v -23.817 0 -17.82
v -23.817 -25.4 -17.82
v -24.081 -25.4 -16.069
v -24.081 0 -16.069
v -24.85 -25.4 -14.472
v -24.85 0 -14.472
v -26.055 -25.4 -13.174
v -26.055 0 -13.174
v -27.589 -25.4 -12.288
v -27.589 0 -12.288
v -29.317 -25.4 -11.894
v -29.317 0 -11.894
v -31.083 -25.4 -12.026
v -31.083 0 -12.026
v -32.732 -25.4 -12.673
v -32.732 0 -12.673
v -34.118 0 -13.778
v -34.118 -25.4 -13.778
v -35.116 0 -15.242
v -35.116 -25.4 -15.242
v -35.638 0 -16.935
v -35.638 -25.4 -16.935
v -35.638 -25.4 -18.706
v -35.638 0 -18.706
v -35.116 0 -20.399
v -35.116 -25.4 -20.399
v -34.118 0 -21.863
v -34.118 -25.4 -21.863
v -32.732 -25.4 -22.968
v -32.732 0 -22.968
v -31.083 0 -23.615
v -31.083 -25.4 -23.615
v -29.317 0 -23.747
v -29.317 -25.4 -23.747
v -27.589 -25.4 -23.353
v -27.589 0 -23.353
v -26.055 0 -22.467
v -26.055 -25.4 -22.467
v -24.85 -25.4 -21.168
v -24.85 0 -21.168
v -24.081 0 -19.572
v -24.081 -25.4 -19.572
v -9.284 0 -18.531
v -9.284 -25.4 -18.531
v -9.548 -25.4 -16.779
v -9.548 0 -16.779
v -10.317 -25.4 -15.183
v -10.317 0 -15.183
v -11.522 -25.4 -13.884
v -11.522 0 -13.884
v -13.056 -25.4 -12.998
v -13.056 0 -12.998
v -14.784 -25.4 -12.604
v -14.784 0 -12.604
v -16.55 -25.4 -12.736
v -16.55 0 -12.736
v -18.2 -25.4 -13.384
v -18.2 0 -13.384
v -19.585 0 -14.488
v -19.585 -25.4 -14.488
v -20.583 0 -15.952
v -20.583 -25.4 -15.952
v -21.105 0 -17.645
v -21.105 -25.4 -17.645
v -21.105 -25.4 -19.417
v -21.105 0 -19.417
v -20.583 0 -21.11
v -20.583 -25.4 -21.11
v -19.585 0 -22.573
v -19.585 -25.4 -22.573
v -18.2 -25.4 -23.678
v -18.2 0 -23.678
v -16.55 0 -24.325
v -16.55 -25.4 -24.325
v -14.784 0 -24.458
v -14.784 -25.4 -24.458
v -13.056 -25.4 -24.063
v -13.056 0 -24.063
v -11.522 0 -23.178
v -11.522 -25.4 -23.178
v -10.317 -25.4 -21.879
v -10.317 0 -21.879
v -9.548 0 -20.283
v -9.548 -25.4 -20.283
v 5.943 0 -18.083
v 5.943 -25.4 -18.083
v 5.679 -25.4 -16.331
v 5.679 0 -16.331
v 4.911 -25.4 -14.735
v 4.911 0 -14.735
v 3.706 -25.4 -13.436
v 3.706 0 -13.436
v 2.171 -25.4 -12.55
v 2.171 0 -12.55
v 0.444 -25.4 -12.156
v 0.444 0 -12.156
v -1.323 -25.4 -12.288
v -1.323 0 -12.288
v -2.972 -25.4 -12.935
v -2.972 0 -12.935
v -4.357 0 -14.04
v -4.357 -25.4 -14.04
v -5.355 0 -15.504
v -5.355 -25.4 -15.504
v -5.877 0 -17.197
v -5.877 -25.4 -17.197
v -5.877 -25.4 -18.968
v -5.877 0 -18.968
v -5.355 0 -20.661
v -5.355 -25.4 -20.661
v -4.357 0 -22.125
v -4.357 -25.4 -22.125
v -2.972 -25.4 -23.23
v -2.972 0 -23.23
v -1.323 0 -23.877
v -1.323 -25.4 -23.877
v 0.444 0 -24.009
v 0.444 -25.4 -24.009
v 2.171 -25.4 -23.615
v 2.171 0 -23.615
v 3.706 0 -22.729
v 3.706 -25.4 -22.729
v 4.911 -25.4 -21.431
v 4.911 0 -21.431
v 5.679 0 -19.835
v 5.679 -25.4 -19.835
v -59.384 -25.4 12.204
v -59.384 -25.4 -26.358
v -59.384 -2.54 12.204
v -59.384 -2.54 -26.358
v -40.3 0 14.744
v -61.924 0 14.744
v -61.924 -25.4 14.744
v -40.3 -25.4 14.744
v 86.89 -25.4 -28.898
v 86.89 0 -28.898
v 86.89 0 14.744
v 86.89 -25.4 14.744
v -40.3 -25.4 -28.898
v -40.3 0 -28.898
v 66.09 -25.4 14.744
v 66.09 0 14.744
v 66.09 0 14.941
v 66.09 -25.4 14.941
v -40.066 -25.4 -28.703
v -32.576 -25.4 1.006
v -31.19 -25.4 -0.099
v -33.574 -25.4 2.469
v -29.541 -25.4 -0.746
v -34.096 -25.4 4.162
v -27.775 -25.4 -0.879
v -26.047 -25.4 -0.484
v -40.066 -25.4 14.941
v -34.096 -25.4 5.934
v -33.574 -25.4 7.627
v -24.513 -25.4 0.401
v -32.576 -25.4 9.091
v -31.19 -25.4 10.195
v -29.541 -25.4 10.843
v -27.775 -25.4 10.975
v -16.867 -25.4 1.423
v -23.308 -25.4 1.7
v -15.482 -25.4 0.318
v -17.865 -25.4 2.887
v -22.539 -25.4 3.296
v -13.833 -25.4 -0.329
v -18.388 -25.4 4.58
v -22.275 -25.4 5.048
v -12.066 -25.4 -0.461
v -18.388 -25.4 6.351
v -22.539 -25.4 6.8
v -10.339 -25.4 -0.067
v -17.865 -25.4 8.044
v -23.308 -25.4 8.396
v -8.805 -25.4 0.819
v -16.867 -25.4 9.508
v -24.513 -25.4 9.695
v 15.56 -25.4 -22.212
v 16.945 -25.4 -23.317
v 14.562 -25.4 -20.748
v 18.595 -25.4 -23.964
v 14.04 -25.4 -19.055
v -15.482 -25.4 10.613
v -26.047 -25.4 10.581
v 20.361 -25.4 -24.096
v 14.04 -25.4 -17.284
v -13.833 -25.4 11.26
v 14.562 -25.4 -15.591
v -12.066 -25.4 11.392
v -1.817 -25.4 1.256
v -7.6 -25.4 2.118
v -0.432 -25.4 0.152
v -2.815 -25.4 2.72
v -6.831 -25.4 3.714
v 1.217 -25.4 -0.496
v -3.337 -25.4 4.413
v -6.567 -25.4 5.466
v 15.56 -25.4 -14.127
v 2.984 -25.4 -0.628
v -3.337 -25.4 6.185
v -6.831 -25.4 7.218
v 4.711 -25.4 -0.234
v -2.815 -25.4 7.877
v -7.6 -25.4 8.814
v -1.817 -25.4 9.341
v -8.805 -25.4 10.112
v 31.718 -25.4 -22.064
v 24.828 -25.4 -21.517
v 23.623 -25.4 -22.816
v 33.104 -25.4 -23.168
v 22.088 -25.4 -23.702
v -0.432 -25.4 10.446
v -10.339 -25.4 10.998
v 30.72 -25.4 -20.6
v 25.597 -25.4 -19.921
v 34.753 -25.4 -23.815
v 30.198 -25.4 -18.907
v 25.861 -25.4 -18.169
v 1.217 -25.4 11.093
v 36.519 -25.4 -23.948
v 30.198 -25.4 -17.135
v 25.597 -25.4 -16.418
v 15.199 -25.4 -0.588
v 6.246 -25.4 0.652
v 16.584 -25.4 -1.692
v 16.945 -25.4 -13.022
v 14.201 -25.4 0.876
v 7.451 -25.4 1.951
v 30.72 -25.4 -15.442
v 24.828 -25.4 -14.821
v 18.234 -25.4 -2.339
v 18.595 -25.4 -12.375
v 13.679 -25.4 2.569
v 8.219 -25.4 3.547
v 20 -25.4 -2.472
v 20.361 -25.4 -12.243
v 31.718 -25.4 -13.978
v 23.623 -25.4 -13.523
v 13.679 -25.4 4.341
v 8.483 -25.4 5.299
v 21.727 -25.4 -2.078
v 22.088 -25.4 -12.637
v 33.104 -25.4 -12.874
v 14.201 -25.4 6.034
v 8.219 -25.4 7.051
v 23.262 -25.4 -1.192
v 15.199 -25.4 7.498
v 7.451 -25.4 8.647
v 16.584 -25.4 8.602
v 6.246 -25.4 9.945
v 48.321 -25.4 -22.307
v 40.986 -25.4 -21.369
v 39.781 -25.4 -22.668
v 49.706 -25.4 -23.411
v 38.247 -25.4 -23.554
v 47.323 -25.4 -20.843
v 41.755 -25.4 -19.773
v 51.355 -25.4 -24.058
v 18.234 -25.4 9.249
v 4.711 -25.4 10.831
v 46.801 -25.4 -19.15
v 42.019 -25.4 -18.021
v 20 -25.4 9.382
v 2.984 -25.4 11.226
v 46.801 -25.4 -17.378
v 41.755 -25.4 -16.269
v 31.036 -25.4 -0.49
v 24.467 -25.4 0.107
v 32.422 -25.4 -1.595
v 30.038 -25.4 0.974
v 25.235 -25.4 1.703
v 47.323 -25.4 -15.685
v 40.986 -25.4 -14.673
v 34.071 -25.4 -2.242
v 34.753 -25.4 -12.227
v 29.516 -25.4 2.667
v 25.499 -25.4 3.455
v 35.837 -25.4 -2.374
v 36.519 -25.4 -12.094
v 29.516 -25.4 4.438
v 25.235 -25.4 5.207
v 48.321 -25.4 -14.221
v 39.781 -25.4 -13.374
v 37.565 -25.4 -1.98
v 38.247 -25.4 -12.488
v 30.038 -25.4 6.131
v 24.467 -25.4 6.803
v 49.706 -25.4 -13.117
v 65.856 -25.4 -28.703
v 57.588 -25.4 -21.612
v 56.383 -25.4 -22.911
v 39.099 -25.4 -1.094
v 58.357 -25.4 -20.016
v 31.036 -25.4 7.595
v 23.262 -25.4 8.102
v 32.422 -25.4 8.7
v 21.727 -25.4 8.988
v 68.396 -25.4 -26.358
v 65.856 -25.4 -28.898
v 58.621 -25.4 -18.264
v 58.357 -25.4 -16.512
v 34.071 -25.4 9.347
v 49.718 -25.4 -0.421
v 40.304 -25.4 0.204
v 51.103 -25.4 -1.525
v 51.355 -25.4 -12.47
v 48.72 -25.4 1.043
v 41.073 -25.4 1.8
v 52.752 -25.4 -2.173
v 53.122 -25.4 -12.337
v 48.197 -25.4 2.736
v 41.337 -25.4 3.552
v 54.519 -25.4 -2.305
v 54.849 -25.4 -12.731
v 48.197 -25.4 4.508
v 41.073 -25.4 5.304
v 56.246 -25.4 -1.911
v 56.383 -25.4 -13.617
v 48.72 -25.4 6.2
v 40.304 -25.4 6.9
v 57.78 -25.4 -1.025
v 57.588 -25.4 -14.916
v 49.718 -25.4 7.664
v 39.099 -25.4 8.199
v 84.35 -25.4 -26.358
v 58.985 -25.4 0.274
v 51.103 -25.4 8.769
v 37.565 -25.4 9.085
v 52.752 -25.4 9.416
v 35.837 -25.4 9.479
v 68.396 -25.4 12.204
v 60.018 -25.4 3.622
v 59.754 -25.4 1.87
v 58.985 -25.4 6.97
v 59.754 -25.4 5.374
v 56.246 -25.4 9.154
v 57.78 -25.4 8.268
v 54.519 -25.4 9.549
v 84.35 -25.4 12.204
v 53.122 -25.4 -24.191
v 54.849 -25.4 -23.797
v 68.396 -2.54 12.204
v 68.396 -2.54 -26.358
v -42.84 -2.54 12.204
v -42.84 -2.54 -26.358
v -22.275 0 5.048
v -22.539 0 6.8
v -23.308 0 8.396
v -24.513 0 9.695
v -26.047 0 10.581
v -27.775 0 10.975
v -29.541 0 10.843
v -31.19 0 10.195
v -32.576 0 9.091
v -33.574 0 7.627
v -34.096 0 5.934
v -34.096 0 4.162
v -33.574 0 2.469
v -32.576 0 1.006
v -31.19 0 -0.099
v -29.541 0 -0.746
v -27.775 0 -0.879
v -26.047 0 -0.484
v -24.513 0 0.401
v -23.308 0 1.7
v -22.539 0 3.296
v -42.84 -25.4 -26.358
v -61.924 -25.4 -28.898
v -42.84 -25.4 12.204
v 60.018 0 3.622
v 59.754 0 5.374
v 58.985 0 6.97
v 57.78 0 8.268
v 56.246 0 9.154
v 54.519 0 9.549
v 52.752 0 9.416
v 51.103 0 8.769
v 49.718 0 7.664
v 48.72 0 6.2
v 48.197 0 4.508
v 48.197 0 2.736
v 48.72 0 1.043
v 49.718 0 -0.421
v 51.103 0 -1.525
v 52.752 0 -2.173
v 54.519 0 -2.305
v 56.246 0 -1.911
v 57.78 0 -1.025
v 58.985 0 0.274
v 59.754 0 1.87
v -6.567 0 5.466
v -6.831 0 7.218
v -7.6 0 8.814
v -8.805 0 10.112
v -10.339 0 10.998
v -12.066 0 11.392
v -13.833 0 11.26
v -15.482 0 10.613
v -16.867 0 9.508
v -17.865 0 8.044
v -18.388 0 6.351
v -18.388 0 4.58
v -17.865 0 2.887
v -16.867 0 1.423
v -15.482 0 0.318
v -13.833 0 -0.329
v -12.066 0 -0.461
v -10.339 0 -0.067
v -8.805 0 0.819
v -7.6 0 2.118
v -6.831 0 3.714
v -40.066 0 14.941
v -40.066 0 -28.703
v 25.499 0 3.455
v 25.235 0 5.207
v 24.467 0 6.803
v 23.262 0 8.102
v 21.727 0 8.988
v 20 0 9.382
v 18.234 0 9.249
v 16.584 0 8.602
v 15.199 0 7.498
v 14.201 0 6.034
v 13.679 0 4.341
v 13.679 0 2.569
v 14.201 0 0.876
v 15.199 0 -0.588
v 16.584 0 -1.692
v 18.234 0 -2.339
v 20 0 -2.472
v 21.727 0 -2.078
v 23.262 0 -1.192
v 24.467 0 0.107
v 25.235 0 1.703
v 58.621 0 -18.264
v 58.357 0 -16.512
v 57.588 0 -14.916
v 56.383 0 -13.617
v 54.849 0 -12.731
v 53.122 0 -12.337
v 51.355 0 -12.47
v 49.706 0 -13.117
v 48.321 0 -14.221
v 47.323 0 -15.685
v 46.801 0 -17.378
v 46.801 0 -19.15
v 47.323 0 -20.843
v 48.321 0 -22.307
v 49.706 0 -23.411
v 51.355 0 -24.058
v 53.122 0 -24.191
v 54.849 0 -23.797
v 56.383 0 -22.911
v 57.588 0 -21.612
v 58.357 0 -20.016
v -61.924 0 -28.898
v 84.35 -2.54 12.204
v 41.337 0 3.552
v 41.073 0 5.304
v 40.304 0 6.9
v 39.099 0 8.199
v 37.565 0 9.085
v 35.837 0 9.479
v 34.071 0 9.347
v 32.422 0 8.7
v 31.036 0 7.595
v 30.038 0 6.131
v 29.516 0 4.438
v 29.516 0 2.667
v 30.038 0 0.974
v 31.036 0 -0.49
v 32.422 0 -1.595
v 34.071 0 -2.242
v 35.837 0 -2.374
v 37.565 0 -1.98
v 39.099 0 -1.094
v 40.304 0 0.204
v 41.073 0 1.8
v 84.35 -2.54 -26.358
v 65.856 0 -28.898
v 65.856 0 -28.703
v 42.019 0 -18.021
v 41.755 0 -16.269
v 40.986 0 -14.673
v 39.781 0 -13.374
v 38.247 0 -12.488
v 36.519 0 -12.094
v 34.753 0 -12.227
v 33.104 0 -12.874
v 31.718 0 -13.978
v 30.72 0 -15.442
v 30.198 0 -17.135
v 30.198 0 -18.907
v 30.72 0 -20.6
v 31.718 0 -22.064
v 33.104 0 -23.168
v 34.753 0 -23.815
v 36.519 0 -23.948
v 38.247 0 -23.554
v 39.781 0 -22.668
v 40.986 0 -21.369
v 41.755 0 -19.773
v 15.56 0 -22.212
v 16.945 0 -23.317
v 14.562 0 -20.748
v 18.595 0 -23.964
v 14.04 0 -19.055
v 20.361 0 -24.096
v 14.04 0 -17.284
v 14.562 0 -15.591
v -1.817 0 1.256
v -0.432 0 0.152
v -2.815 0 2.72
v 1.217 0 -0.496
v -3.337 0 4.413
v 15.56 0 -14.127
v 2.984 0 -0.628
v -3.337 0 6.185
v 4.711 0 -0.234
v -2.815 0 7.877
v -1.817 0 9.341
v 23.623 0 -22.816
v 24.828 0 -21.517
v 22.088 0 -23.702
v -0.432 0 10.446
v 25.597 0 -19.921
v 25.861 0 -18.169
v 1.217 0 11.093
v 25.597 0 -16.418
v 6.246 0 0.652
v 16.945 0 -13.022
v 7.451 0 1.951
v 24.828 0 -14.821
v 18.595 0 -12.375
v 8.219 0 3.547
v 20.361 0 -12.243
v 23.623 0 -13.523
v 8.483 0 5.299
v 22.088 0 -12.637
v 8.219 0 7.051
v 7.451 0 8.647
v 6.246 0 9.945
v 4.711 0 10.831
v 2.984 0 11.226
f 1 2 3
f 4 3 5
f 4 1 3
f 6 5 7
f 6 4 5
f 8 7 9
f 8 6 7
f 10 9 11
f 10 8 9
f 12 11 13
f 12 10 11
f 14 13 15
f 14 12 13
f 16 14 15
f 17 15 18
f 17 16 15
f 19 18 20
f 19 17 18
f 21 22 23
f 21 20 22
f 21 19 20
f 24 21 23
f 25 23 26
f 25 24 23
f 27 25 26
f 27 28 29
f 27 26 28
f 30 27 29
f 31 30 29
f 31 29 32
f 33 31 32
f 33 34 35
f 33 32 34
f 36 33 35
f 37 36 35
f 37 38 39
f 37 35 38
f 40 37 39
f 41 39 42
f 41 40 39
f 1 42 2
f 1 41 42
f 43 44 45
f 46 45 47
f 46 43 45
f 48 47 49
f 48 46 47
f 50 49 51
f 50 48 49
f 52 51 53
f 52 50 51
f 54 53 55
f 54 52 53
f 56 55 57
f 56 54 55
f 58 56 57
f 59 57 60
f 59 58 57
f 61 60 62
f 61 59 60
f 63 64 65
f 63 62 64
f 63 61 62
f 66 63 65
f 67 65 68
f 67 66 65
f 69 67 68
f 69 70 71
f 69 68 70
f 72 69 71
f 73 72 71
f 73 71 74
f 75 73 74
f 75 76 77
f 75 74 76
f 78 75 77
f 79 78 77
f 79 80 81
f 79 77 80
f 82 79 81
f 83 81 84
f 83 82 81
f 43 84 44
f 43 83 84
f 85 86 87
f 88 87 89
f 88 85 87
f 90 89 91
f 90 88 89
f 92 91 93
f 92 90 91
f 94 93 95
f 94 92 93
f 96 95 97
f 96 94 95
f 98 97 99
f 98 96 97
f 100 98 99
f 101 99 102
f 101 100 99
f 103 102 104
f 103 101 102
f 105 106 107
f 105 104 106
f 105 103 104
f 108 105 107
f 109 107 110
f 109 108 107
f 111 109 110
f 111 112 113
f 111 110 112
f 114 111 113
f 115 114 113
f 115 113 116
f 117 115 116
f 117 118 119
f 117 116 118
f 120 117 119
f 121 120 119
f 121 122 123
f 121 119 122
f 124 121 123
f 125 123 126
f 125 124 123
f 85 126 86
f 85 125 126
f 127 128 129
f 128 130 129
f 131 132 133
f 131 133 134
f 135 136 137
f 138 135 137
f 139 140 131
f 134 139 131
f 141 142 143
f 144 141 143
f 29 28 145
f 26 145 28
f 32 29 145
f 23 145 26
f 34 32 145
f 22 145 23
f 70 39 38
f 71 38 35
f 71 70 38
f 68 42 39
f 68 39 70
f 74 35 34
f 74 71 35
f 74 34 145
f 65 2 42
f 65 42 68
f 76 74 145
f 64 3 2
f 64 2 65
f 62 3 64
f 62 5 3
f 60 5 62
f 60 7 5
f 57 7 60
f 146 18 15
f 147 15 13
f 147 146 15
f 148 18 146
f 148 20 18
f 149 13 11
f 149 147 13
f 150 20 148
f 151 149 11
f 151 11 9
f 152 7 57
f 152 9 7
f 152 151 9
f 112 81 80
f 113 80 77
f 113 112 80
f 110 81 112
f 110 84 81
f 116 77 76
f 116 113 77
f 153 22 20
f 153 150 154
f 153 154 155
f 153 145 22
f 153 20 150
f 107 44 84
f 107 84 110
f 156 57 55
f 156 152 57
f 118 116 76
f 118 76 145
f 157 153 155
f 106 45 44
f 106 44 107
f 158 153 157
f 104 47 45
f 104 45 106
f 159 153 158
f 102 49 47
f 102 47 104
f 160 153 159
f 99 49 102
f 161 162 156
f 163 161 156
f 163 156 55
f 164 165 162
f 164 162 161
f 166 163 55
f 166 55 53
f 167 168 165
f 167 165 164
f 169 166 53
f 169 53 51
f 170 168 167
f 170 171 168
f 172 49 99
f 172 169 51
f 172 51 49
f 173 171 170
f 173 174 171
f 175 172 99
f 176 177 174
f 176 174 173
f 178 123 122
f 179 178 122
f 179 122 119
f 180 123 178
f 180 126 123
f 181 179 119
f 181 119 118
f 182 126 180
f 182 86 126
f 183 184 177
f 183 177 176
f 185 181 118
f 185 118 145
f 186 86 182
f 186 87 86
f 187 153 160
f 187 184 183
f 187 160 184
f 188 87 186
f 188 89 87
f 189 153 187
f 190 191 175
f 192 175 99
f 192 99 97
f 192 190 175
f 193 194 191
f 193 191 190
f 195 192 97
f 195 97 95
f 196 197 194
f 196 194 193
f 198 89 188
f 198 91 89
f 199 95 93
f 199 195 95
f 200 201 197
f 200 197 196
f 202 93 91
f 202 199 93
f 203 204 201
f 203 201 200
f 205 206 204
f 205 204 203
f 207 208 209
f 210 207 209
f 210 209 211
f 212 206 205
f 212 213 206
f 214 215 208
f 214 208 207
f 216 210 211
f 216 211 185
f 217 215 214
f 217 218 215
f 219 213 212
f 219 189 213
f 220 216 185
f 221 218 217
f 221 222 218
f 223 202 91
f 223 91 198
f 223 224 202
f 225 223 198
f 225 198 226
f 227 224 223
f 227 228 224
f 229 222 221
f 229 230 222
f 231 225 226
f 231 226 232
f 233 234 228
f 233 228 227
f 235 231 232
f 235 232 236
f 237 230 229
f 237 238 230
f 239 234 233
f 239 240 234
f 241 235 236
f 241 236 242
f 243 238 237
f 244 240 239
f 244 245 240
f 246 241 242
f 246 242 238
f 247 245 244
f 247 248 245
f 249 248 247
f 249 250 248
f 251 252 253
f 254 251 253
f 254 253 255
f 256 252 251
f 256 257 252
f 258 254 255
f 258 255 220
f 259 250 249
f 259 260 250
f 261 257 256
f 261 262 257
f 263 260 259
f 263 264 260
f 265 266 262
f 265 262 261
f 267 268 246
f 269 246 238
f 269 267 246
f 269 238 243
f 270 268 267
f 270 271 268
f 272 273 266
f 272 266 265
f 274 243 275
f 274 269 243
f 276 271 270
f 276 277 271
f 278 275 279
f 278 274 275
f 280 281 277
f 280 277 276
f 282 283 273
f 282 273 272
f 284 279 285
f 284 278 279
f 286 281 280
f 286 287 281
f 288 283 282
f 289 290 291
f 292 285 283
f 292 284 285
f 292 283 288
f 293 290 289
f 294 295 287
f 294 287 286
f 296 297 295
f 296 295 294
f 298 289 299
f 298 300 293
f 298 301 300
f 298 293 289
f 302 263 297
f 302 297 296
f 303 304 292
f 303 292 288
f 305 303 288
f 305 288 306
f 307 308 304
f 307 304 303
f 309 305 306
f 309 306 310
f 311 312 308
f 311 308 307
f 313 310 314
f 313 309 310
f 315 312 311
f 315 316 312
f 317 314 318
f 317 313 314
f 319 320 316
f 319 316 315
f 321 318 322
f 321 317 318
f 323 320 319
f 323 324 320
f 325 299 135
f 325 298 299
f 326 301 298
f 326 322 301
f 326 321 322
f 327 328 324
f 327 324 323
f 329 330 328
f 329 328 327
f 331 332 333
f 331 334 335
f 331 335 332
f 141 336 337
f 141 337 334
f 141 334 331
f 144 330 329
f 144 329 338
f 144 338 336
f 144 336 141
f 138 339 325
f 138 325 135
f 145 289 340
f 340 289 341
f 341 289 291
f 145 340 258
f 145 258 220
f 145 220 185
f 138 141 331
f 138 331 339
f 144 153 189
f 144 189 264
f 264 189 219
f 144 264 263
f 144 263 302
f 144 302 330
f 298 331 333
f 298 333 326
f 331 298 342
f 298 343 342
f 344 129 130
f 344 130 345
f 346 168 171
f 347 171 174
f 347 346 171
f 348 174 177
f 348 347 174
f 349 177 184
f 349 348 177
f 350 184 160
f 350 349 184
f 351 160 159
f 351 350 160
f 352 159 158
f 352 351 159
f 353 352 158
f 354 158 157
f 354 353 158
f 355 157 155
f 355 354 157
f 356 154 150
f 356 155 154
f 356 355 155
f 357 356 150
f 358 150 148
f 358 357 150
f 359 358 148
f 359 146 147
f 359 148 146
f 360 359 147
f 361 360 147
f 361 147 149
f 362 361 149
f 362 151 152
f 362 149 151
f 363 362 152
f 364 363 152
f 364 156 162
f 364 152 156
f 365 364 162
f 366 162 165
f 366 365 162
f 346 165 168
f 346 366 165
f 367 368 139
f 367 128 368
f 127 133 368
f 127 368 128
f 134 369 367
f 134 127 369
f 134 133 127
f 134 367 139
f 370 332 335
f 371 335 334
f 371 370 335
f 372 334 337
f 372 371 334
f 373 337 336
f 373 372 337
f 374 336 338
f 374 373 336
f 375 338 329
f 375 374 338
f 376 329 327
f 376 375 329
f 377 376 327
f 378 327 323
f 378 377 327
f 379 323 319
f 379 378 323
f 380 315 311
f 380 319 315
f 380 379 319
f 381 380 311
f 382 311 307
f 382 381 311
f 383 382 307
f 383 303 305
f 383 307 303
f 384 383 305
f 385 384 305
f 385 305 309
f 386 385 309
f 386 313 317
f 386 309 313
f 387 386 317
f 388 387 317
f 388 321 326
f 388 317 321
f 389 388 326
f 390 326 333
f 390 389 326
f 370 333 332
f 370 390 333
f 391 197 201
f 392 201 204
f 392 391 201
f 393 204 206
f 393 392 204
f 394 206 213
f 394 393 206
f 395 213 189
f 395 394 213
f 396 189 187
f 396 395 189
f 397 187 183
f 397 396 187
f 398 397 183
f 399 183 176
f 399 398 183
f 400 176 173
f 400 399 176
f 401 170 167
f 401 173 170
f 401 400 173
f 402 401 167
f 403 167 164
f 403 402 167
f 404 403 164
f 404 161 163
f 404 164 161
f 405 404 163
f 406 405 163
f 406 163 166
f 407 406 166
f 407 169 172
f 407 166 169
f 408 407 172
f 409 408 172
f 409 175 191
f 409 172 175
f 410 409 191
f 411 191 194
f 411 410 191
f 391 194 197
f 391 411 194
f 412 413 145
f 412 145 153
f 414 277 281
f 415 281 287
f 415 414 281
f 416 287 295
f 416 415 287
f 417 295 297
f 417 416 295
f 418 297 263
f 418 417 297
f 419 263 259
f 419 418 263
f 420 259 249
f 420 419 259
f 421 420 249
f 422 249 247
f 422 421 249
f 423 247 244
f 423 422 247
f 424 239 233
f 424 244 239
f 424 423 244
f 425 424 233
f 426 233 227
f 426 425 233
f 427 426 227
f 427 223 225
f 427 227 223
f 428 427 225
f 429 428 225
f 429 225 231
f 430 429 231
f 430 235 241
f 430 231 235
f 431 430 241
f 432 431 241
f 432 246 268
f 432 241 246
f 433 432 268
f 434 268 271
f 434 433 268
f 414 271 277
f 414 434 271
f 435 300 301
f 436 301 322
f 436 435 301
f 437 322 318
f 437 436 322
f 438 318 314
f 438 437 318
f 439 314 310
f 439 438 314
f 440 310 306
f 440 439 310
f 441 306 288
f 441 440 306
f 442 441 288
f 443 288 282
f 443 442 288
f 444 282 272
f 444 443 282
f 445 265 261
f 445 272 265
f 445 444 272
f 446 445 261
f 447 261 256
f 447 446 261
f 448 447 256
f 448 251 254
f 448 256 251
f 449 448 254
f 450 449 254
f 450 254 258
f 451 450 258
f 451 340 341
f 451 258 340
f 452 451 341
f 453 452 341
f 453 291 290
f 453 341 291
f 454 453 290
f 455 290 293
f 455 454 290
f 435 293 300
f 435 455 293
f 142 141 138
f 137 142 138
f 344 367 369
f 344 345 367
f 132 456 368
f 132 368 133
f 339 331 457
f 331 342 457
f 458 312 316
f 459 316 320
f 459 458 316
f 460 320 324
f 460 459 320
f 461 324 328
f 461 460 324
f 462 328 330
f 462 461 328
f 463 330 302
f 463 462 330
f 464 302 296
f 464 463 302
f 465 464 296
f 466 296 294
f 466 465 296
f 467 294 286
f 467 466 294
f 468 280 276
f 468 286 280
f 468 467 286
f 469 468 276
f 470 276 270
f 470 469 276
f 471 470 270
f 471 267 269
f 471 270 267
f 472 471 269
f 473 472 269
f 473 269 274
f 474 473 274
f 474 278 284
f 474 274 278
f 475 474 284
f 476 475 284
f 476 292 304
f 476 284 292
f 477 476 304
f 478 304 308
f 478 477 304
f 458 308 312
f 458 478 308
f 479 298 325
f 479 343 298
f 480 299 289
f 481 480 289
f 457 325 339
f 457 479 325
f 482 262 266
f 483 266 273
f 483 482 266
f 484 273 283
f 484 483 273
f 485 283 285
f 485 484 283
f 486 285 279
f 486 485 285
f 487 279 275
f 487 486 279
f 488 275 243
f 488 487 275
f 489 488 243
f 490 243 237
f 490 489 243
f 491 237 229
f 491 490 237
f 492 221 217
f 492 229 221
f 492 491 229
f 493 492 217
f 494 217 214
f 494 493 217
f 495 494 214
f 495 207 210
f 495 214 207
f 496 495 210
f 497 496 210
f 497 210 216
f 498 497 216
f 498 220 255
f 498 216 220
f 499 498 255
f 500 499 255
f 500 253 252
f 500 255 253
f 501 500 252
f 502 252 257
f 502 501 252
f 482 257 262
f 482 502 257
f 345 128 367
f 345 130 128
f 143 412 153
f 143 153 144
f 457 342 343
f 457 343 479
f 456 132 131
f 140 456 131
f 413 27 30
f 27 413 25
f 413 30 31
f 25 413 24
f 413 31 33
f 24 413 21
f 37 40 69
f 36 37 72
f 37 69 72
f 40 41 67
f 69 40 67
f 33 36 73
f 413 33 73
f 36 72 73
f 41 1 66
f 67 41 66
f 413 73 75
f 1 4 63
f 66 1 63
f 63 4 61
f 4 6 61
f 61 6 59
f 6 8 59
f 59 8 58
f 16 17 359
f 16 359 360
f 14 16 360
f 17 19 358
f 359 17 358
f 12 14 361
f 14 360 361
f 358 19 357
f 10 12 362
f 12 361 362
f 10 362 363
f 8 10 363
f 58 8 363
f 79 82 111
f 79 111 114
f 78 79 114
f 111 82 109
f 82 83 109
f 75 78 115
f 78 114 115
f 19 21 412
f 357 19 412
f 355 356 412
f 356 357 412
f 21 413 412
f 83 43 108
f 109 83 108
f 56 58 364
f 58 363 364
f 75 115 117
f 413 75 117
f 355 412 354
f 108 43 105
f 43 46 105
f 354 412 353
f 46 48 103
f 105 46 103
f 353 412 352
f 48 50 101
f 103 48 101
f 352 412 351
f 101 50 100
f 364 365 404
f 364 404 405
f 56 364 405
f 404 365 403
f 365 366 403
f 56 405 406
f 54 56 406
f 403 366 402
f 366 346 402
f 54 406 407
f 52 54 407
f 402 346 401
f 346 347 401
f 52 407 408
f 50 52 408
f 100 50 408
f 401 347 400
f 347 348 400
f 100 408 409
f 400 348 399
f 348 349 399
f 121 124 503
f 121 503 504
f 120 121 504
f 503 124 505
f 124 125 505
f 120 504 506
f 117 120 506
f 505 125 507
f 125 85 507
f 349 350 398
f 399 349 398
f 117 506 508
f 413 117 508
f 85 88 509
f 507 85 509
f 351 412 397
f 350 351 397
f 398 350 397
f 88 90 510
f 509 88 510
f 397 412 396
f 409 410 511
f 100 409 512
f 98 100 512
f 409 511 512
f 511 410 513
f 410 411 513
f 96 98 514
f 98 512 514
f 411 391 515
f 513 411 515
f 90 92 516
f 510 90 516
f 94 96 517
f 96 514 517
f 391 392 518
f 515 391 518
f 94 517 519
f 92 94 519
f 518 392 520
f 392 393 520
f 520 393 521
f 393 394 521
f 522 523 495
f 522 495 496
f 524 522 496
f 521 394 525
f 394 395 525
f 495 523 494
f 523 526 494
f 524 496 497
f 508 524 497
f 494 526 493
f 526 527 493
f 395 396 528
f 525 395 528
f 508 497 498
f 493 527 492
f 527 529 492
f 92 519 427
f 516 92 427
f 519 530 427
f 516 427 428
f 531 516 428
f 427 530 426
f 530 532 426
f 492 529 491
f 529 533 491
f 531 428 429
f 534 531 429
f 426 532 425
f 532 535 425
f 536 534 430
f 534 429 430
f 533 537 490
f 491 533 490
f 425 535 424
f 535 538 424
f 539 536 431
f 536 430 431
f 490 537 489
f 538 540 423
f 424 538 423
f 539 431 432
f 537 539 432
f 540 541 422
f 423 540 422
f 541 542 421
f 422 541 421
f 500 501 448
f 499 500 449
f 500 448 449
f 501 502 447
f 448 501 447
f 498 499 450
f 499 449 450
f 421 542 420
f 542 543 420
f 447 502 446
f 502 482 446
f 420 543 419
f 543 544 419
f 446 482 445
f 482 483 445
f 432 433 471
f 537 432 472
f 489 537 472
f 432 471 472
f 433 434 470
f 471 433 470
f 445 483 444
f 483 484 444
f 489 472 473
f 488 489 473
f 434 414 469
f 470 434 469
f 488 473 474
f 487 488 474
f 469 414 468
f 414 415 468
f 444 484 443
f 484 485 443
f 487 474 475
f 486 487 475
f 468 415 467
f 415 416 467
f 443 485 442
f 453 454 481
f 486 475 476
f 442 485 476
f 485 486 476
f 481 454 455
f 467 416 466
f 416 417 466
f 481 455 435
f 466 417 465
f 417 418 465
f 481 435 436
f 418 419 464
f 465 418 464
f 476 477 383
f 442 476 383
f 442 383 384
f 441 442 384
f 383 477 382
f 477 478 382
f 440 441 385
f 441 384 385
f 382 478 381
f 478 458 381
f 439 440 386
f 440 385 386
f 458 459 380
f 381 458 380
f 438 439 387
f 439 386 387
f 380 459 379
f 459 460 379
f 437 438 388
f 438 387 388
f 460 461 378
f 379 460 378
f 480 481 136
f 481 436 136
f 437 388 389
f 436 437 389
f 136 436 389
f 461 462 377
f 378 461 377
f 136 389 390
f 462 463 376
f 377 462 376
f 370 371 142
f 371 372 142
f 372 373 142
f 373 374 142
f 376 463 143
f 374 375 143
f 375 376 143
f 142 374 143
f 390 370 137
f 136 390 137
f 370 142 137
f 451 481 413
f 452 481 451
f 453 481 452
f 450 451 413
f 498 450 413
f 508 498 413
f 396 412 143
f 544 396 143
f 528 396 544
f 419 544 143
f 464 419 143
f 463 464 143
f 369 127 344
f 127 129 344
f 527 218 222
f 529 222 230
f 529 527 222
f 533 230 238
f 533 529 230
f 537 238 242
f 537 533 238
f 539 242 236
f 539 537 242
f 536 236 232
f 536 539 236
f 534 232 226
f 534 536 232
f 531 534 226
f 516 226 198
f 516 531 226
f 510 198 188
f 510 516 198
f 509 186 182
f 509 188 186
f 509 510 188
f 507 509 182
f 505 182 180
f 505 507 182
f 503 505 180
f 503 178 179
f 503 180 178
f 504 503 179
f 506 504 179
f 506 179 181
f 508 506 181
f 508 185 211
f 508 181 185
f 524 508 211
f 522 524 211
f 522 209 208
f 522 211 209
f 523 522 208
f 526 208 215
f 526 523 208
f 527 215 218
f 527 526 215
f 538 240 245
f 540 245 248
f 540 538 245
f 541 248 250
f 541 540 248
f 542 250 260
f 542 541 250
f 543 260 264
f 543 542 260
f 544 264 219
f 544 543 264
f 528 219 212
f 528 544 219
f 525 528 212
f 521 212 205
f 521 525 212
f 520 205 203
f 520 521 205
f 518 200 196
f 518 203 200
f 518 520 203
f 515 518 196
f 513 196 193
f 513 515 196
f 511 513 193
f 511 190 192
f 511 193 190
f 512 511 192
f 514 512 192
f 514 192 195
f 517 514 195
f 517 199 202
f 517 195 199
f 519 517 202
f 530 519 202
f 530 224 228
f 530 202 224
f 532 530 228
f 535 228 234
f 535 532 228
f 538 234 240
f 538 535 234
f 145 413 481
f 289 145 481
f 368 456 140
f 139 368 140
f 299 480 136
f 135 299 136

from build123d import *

# Parameters (mm, degrees)
F0_W     = 21.6243267059
F0_H     = 43.6418168247
F1_DEPTH = 25.4
F0_W_2   = 21.0345685482
F2_T     = -2.54
F2_2_T   = -2.54
F3_W     = 106.1557754874
F3_H     = 43.6440445483
F4_DEPTH = 25.4
F5_R     = 5.9434435219
F6_DEPTH = 75.184


with BuildPart() as f1:
    # F0 (on Front) → F1 (new body)
    with BuildSketch(Plane.XZ):
        with Locations((-51.1120408773, -7.0770513266)):
            Rectangle(F0_W, F0_H)
    extrude(amount=F1_DEPTH)

    # F2#2
    f2_2_openings = [f1.faces().sort_by_distance(p)[0] for p in [
        (-51.112041, -25.4, -7.077051),
    ]]
    offset(amount=F2_2_T, openings=f2_2_openings)


with BuildPart() as f1b:
    # F0 (on Front) → F1, piece 2 (new body)
    with BuildSketch(Plane.XZ):
        with Locations((76.3731822371, -7.0770513266)):
            Rectangle(F0_W_2, F0_H)
    extrude(amount=F1_DEPTH)

    # F2
    f2_openings = [f1b.faces().sort_by_distance(p)[0] for p in [
        (76.373182, -25.4, -7.077051),
    ]]
    offset(amount=F2_T, openings=f2_openings)

    # F3 (on Front) → F4 (join)
    with BuildSketch(Plane.XZ):
        with Locations((13.0120404065, -6.8808179349)):
            Rectangle(F3_W, F3_H)
    extrude(amount=F4_DEPTH)

    # F5 (on Front) → F6 (cut)
    with BuildSketch(Plane.XZ):
        with Locations((-29.7606922686, -17.8204365075)):
            Circle(F5_R)
        with Locations((-15.2278486639, -18.5308177024)):
            Circle(F5_R)
        with Locations((0, -18.0826429278)):
            Circle(F5_R)
        with Locations((19.9171081185, -18.1694161147)):
            Circle(F5_R)
        with Locations((36.0753312707, -18.0209558457)):
            Circle(F5_R)
        with Locations((52.6777617633, -18.2640459388)):
            Circle(F5_R)
        with Locations((54.0743649769, 3.6217127527)):
            Circle(F5_R)
        with Locations((35.3932604194, 3.5523551051)):
            Circle(F5_R)
        with Locations((19.5560548455, 3.4549408592)):
            Circle(F5_R)
        with Locations((2.5400002487, 5.2987192757)):
            Circle(F5_R)
        with Locations((-12.5105176121, 5.4656430148)):
            Circle(F5_R)
        with Locations((-28.2187122126, 5.0482510096)):
            Circle(F5_R)
    extrude(amount=F6_DEPTH, mode=Mode.SUBTRACT)


solid = Compound([f1.part, f1b.part])
